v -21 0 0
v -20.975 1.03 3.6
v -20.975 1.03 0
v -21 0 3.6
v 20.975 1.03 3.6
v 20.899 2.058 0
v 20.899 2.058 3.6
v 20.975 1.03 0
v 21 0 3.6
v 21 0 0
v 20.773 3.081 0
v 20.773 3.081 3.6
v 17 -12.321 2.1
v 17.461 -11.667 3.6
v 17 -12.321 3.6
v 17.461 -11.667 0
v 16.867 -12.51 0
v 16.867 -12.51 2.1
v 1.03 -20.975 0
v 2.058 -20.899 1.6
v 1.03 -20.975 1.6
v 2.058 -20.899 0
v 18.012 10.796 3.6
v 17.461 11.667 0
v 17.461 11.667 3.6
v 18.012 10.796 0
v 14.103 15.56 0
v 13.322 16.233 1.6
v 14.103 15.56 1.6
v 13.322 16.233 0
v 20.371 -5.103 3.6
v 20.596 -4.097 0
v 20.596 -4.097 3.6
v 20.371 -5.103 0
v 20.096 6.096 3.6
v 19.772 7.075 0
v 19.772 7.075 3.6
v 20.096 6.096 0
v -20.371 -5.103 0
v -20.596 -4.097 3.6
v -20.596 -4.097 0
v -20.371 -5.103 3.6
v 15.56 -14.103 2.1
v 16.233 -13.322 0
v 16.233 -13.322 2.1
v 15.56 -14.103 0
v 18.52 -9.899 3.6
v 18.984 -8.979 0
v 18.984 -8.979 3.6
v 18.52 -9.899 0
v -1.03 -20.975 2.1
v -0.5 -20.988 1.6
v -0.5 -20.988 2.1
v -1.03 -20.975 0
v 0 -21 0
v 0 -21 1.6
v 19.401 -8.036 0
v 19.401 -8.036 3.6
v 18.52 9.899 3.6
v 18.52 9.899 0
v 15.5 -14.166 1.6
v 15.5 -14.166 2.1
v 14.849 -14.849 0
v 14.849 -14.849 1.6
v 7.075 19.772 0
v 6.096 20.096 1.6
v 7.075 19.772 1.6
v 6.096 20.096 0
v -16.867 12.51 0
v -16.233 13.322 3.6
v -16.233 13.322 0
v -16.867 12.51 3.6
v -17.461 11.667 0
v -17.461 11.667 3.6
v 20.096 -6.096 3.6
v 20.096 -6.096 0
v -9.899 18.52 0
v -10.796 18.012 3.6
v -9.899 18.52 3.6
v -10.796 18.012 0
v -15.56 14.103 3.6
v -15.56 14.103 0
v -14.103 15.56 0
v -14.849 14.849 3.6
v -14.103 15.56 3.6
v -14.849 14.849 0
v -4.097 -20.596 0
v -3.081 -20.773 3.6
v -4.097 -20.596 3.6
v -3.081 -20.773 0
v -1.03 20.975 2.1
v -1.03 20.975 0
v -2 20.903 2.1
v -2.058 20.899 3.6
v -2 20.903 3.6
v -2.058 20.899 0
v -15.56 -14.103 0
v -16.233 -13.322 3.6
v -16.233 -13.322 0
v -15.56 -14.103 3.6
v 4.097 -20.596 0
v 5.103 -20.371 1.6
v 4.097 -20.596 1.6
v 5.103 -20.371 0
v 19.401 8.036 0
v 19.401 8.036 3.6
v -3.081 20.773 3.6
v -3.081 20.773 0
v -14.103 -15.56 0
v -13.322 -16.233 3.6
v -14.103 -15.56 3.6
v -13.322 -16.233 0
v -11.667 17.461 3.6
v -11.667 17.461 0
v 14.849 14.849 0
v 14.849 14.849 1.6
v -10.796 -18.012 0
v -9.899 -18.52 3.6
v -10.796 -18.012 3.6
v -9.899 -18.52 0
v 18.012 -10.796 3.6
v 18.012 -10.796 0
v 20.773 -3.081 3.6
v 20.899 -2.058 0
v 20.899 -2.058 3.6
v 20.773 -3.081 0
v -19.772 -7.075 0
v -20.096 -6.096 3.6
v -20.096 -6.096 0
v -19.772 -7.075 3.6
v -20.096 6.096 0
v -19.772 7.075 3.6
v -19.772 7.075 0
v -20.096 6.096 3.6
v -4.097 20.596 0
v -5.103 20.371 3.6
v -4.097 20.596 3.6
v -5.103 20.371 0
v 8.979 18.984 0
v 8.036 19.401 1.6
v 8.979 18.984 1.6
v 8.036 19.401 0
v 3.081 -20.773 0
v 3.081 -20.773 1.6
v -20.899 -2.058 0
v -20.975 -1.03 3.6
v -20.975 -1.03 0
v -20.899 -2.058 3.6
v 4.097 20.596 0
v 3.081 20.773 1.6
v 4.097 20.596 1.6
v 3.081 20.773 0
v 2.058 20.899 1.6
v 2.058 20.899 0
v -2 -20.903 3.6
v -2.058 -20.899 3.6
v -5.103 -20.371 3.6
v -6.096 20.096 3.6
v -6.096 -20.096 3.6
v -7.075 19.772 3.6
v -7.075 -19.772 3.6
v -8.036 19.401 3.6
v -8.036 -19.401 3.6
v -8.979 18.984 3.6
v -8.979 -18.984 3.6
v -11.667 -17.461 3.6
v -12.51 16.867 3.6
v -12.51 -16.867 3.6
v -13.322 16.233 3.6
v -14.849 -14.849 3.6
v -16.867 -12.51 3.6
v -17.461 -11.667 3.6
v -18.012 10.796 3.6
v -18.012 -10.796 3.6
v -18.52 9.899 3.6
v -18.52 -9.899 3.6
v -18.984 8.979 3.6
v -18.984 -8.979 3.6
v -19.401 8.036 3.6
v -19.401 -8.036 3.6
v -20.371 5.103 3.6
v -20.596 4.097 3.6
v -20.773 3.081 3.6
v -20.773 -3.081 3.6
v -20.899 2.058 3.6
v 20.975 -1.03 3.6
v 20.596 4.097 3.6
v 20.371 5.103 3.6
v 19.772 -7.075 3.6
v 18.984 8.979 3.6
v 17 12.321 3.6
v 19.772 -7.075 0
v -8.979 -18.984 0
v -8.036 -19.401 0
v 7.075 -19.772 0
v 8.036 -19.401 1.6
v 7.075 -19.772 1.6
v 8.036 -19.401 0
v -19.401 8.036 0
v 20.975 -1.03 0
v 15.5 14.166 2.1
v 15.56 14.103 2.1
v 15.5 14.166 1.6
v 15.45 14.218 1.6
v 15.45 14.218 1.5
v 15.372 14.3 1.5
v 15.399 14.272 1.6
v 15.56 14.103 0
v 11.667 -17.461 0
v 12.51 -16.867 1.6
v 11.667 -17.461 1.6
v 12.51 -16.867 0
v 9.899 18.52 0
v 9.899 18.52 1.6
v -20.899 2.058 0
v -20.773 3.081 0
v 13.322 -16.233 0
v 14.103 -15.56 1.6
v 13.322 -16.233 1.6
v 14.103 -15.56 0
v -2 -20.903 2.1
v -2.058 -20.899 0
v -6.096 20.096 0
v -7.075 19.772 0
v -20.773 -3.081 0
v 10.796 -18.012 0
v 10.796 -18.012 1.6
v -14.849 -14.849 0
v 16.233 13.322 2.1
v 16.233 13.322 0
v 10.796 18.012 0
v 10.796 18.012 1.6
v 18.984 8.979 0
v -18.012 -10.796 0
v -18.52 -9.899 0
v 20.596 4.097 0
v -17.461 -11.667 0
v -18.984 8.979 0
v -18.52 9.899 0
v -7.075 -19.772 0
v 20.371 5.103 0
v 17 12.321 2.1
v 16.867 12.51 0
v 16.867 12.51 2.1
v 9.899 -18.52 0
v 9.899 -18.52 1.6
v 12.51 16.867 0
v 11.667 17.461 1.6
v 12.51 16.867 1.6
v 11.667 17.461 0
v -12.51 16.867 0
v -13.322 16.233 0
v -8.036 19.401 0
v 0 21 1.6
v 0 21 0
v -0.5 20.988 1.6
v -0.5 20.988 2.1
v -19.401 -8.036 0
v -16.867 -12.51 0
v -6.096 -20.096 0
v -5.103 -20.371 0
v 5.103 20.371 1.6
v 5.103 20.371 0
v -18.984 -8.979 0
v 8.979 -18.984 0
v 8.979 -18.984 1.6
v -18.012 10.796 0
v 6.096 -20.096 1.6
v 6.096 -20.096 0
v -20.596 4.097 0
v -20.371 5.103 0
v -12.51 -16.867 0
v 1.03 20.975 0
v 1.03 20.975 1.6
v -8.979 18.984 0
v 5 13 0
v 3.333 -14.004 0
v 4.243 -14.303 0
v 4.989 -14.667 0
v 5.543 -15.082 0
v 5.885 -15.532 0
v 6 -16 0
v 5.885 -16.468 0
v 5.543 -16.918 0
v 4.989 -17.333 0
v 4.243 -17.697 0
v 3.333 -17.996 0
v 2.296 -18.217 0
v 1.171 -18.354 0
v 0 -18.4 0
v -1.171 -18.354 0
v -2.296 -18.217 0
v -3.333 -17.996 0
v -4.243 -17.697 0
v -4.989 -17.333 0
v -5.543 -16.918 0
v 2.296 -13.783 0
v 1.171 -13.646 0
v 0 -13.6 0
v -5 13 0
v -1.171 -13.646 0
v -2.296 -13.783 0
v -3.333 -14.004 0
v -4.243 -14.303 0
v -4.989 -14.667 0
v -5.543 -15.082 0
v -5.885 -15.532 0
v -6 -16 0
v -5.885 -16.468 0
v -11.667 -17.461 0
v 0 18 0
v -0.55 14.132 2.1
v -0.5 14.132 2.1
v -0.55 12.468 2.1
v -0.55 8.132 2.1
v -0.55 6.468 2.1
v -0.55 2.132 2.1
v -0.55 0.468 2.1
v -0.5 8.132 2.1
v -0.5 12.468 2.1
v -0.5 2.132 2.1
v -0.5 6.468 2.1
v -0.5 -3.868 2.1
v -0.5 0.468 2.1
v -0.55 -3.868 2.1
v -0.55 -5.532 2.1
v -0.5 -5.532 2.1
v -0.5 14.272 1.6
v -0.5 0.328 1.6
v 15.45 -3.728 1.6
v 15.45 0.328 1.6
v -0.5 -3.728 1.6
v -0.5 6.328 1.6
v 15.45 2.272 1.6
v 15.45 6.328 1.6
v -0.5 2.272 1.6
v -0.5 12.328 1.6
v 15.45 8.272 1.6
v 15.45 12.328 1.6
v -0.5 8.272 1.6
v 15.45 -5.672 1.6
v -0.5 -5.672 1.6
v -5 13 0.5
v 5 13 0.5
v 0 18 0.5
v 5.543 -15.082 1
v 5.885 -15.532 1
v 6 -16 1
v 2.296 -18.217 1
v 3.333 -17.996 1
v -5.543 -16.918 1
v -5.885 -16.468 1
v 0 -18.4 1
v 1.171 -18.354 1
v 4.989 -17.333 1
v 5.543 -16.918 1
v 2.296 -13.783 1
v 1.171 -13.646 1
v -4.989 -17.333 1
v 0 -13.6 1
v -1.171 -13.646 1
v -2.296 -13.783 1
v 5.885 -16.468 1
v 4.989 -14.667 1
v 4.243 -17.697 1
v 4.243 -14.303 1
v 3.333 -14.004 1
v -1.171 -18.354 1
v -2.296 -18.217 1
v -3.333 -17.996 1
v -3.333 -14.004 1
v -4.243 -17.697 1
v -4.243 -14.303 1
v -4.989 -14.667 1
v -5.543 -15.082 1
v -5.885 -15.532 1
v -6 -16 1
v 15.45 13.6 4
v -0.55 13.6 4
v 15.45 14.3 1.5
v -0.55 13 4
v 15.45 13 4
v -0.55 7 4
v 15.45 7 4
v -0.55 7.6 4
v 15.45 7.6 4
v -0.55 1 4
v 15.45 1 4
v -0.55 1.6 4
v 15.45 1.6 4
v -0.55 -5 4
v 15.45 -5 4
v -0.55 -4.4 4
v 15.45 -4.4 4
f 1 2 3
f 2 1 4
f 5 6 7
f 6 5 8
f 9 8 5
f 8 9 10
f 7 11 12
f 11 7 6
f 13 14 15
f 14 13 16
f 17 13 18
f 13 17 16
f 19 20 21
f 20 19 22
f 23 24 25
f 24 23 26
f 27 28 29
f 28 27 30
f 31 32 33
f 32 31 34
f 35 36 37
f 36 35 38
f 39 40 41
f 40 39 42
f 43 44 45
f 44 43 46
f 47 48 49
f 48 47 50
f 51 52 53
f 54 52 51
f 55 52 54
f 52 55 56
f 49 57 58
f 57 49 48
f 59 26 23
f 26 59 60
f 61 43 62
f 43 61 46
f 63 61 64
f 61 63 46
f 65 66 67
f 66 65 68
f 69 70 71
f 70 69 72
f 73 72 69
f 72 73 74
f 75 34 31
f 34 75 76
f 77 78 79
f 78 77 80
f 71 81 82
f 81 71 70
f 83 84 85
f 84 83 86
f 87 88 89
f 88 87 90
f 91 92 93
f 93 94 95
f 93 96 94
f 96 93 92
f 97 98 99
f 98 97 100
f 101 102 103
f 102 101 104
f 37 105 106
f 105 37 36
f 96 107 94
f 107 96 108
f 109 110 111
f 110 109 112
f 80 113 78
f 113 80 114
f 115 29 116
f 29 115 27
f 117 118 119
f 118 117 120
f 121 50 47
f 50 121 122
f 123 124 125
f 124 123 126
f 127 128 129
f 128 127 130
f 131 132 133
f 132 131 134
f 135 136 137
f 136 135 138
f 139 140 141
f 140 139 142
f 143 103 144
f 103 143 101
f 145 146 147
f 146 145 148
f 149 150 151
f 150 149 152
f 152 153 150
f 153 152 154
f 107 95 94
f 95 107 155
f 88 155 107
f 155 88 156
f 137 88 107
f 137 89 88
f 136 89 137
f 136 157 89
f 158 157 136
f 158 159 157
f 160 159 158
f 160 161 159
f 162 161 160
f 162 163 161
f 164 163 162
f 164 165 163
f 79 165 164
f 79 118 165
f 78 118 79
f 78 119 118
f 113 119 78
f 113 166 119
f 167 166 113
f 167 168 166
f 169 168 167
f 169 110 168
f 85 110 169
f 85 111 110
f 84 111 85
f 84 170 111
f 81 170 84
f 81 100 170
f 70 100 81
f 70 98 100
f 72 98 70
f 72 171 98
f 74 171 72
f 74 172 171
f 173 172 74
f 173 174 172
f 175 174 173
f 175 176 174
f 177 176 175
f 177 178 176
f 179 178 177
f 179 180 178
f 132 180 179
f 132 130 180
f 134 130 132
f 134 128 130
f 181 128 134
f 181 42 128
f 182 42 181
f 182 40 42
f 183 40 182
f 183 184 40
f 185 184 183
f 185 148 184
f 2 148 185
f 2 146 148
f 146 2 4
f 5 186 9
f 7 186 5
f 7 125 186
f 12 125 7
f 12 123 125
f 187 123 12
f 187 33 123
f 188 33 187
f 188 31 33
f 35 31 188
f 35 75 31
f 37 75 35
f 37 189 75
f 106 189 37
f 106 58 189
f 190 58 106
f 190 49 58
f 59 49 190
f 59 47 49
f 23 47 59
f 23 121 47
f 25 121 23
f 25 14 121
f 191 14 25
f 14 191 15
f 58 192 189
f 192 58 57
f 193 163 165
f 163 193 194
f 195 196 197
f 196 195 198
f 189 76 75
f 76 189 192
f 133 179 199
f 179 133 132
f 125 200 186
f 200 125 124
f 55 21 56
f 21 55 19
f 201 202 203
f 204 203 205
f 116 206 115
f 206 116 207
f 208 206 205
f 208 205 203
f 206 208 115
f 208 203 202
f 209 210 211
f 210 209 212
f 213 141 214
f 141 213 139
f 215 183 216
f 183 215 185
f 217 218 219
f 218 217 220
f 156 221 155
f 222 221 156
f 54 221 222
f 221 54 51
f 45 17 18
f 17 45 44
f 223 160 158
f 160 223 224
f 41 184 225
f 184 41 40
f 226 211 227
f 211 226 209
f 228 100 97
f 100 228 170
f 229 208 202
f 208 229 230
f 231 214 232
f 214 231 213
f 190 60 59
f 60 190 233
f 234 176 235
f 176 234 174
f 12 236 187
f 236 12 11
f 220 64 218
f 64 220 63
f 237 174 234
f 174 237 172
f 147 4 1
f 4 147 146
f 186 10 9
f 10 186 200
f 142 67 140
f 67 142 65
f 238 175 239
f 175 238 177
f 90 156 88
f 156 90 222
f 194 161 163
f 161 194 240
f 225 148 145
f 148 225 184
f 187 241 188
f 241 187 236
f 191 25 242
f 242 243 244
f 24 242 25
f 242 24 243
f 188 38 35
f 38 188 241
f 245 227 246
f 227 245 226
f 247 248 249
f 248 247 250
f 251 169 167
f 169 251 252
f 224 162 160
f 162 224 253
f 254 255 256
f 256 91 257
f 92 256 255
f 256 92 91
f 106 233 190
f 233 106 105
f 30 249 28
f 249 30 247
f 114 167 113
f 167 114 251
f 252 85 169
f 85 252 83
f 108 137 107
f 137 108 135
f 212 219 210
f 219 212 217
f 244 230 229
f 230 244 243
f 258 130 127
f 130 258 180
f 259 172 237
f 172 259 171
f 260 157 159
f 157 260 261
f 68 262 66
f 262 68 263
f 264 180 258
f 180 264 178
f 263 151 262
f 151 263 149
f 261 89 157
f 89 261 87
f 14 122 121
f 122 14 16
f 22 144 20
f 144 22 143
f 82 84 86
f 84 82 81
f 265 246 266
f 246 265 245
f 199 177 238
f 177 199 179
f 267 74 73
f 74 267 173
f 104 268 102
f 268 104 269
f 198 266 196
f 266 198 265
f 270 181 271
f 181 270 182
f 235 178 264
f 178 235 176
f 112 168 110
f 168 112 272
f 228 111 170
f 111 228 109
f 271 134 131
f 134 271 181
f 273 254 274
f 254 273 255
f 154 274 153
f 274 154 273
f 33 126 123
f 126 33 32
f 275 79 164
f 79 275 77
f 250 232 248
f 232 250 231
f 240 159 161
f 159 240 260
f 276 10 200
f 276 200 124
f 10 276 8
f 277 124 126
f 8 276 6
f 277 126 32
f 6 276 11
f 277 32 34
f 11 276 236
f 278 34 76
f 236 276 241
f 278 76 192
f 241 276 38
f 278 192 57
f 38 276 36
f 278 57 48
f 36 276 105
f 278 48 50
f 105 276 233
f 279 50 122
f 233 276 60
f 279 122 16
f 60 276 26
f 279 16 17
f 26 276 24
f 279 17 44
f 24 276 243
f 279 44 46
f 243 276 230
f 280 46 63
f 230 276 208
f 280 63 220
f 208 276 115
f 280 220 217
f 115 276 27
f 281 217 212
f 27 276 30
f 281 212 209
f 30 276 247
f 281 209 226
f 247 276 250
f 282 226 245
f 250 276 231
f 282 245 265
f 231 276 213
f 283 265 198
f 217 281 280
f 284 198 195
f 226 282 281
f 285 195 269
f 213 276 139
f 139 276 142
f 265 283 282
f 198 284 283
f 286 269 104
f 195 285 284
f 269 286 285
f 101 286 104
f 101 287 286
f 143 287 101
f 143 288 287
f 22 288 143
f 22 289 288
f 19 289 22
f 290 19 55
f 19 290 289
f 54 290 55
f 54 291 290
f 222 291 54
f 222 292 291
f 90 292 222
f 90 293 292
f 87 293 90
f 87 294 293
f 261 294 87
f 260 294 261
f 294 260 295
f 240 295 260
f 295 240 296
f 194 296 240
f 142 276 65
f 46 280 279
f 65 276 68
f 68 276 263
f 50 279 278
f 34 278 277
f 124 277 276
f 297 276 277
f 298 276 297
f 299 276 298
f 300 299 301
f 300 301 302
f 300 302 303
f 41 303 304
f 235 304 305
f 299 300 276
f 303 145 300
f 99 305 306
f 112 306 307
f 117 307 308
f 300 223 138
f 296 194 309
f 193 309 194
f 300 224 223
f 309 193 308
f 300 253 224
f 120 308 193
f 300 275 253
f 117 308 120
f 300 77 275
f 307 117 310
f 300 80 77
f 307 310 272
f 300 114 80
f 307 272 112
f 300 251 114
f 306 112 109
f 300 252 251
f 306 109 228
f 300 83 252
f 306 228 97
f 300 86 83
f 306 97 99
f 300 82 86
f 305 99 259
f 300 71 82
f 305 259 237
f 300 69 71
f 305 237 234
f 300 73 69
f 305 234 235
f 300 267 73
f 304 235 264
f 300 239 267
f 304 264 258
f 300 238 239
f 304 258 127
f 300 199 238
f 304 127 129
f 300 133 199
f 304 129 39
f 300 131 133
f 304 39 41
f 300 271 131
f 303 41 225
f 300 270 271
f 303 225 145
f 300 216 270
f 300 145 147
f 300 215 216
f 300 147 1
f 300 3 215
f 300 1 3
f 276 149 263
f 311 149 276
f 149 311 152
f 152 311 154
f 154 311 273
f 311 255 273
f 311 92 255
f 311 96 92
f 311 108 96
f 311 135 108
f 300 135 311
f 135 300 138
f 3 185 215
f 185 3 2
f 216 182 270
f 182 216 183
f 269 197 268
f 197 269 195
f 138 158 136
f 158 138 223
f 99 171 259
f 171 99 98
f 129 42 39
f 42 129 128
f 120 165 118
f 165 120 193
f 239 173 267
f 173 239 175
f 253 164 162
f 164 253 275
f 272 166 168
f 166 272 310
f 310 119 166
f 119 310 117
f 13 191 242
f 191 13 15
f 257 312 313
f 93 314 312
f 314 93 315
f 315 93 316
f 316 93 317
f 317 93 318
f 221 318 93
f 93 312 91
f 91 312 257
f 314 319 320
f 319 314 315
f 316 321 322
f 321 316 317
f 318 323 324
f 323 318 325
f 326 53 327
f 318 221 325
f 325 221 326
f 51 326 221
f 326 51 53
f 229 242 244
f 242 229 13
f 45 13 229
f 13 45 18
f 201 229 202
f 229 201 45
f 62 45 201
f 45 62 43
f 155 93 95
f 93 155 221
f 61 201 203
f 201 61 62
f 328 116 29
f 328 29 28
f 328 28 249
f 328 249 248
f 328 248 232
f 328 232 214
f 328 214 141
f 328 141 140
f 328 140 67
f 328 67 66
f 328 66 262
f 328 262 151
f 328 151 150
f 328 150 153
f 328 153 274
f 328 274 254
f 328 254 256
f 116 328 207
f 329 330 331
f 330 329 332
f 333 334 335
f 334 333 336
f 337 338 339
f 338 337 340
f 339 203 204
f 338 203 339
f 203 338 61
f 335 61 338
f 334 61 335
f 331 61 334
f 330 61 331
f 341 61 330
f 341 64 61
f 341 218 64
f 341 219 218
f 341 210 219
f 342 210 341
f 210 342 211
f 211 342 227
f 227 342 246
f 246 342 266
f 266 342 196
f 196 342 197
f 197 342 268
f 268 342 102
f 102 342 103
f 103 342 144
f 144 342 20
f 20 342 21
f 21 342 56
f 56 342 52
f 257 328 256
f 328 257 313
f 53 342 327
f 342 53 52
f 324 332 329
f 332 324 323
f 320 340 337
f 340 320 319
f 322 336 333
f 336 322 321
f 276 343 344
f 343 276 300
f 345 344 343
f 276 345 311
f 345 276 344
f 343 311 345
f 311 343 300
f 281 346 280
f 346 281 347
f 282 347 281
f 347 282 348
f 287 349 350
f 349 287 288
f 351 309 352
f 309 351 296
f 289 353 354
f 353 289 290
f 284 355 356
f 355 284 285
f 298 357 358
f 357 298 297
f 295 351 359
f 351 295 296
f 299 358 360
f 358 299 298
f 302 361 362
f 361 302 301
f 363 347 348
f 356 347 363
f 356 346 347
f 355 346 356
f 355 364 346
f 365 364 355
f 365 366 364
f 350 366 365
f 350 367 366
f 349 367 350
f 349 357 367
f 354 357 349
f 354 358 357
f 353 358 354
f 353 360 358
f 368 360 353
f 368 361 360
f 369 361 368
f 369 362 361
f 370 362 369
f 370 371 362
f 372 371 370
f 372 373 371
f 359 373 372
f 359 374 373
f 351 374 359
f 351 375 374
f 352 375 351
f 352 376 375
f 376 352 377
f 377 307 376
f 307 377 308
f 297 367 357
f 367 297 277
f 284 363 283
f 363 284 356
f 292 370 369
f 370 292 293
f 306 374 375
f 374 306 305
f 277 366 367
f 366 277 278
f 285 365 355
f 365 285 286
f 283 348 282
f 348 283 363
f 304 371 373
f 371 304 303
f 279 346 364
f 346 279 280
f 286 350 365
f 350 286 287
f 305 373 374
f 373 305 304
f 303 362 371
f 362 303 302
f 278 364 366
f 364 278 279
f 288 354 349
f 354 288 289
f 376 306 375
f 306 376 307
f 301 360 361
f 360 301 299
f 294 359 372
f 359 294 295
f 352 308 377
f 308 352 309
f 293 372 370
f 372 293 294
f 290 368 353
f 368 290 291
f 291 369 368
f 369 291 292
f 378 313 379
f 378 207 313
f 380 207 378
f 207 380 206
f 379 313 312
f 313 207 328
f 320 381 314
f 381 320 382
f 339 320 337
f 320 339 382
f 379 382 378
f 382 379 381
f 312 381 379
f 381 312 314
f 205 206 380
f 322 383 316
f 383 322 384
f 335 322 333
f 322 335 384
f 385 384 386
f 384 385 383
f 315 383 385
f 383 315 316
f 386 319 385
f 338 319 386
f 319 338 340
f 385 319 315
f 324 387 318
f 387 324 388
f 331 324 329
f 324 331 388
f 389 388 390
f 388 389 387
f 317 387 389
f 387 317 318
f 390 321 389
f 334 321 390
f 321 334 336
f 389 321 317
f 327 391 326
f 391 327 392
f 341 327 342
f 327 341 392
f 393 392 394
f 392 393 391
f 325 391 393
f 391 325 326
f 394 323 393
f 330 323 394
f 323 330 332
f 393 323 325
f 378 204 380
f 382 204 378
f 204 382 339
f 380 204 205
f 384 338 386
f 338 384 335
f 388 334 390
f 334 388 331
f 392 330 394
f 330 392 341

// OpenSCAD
// YokaiWatchMedal.scad

pegList = [[1,1,1,1],[1,1,1,1],[1,1,1,1],[1,1,1,1]];

union() {
    difference() {
        cylinder(3.6,21,21,$fn=128);
        translate([7.5,0,3.6]) cube([19,60,3], center=true);
        translate([7.5,0,3.1]) cube([16,60,3], center=true);
        translate([0,13,-2])
            linear_extrude(height = 5, center = true, convexity = 10, twist = 0)
                polygon(points = [[5, 0], [-5, 0], [0, 5]]);
        translate([0,-16,-2]) scale([1,0.4,1]) cylinder(3,6,6,$fn=32);
    }
    startPos = [1.45,13.3,1.5];
    for (a=[1:4])
        for (b=[1:4])
            if ((pegList[b-1])[a-1])
                translate(startPos + [((a-1)*4),((b-1)*-6),0])
                    rotate([90,0,90])
                        linear_extrude(height = 4, center = true, convexity = 10, twist = 0)
                            polygon(points = [[1, 0], [-1, 0], [-0.3, 2.5], [0.3, 2.5]]);
        
}
